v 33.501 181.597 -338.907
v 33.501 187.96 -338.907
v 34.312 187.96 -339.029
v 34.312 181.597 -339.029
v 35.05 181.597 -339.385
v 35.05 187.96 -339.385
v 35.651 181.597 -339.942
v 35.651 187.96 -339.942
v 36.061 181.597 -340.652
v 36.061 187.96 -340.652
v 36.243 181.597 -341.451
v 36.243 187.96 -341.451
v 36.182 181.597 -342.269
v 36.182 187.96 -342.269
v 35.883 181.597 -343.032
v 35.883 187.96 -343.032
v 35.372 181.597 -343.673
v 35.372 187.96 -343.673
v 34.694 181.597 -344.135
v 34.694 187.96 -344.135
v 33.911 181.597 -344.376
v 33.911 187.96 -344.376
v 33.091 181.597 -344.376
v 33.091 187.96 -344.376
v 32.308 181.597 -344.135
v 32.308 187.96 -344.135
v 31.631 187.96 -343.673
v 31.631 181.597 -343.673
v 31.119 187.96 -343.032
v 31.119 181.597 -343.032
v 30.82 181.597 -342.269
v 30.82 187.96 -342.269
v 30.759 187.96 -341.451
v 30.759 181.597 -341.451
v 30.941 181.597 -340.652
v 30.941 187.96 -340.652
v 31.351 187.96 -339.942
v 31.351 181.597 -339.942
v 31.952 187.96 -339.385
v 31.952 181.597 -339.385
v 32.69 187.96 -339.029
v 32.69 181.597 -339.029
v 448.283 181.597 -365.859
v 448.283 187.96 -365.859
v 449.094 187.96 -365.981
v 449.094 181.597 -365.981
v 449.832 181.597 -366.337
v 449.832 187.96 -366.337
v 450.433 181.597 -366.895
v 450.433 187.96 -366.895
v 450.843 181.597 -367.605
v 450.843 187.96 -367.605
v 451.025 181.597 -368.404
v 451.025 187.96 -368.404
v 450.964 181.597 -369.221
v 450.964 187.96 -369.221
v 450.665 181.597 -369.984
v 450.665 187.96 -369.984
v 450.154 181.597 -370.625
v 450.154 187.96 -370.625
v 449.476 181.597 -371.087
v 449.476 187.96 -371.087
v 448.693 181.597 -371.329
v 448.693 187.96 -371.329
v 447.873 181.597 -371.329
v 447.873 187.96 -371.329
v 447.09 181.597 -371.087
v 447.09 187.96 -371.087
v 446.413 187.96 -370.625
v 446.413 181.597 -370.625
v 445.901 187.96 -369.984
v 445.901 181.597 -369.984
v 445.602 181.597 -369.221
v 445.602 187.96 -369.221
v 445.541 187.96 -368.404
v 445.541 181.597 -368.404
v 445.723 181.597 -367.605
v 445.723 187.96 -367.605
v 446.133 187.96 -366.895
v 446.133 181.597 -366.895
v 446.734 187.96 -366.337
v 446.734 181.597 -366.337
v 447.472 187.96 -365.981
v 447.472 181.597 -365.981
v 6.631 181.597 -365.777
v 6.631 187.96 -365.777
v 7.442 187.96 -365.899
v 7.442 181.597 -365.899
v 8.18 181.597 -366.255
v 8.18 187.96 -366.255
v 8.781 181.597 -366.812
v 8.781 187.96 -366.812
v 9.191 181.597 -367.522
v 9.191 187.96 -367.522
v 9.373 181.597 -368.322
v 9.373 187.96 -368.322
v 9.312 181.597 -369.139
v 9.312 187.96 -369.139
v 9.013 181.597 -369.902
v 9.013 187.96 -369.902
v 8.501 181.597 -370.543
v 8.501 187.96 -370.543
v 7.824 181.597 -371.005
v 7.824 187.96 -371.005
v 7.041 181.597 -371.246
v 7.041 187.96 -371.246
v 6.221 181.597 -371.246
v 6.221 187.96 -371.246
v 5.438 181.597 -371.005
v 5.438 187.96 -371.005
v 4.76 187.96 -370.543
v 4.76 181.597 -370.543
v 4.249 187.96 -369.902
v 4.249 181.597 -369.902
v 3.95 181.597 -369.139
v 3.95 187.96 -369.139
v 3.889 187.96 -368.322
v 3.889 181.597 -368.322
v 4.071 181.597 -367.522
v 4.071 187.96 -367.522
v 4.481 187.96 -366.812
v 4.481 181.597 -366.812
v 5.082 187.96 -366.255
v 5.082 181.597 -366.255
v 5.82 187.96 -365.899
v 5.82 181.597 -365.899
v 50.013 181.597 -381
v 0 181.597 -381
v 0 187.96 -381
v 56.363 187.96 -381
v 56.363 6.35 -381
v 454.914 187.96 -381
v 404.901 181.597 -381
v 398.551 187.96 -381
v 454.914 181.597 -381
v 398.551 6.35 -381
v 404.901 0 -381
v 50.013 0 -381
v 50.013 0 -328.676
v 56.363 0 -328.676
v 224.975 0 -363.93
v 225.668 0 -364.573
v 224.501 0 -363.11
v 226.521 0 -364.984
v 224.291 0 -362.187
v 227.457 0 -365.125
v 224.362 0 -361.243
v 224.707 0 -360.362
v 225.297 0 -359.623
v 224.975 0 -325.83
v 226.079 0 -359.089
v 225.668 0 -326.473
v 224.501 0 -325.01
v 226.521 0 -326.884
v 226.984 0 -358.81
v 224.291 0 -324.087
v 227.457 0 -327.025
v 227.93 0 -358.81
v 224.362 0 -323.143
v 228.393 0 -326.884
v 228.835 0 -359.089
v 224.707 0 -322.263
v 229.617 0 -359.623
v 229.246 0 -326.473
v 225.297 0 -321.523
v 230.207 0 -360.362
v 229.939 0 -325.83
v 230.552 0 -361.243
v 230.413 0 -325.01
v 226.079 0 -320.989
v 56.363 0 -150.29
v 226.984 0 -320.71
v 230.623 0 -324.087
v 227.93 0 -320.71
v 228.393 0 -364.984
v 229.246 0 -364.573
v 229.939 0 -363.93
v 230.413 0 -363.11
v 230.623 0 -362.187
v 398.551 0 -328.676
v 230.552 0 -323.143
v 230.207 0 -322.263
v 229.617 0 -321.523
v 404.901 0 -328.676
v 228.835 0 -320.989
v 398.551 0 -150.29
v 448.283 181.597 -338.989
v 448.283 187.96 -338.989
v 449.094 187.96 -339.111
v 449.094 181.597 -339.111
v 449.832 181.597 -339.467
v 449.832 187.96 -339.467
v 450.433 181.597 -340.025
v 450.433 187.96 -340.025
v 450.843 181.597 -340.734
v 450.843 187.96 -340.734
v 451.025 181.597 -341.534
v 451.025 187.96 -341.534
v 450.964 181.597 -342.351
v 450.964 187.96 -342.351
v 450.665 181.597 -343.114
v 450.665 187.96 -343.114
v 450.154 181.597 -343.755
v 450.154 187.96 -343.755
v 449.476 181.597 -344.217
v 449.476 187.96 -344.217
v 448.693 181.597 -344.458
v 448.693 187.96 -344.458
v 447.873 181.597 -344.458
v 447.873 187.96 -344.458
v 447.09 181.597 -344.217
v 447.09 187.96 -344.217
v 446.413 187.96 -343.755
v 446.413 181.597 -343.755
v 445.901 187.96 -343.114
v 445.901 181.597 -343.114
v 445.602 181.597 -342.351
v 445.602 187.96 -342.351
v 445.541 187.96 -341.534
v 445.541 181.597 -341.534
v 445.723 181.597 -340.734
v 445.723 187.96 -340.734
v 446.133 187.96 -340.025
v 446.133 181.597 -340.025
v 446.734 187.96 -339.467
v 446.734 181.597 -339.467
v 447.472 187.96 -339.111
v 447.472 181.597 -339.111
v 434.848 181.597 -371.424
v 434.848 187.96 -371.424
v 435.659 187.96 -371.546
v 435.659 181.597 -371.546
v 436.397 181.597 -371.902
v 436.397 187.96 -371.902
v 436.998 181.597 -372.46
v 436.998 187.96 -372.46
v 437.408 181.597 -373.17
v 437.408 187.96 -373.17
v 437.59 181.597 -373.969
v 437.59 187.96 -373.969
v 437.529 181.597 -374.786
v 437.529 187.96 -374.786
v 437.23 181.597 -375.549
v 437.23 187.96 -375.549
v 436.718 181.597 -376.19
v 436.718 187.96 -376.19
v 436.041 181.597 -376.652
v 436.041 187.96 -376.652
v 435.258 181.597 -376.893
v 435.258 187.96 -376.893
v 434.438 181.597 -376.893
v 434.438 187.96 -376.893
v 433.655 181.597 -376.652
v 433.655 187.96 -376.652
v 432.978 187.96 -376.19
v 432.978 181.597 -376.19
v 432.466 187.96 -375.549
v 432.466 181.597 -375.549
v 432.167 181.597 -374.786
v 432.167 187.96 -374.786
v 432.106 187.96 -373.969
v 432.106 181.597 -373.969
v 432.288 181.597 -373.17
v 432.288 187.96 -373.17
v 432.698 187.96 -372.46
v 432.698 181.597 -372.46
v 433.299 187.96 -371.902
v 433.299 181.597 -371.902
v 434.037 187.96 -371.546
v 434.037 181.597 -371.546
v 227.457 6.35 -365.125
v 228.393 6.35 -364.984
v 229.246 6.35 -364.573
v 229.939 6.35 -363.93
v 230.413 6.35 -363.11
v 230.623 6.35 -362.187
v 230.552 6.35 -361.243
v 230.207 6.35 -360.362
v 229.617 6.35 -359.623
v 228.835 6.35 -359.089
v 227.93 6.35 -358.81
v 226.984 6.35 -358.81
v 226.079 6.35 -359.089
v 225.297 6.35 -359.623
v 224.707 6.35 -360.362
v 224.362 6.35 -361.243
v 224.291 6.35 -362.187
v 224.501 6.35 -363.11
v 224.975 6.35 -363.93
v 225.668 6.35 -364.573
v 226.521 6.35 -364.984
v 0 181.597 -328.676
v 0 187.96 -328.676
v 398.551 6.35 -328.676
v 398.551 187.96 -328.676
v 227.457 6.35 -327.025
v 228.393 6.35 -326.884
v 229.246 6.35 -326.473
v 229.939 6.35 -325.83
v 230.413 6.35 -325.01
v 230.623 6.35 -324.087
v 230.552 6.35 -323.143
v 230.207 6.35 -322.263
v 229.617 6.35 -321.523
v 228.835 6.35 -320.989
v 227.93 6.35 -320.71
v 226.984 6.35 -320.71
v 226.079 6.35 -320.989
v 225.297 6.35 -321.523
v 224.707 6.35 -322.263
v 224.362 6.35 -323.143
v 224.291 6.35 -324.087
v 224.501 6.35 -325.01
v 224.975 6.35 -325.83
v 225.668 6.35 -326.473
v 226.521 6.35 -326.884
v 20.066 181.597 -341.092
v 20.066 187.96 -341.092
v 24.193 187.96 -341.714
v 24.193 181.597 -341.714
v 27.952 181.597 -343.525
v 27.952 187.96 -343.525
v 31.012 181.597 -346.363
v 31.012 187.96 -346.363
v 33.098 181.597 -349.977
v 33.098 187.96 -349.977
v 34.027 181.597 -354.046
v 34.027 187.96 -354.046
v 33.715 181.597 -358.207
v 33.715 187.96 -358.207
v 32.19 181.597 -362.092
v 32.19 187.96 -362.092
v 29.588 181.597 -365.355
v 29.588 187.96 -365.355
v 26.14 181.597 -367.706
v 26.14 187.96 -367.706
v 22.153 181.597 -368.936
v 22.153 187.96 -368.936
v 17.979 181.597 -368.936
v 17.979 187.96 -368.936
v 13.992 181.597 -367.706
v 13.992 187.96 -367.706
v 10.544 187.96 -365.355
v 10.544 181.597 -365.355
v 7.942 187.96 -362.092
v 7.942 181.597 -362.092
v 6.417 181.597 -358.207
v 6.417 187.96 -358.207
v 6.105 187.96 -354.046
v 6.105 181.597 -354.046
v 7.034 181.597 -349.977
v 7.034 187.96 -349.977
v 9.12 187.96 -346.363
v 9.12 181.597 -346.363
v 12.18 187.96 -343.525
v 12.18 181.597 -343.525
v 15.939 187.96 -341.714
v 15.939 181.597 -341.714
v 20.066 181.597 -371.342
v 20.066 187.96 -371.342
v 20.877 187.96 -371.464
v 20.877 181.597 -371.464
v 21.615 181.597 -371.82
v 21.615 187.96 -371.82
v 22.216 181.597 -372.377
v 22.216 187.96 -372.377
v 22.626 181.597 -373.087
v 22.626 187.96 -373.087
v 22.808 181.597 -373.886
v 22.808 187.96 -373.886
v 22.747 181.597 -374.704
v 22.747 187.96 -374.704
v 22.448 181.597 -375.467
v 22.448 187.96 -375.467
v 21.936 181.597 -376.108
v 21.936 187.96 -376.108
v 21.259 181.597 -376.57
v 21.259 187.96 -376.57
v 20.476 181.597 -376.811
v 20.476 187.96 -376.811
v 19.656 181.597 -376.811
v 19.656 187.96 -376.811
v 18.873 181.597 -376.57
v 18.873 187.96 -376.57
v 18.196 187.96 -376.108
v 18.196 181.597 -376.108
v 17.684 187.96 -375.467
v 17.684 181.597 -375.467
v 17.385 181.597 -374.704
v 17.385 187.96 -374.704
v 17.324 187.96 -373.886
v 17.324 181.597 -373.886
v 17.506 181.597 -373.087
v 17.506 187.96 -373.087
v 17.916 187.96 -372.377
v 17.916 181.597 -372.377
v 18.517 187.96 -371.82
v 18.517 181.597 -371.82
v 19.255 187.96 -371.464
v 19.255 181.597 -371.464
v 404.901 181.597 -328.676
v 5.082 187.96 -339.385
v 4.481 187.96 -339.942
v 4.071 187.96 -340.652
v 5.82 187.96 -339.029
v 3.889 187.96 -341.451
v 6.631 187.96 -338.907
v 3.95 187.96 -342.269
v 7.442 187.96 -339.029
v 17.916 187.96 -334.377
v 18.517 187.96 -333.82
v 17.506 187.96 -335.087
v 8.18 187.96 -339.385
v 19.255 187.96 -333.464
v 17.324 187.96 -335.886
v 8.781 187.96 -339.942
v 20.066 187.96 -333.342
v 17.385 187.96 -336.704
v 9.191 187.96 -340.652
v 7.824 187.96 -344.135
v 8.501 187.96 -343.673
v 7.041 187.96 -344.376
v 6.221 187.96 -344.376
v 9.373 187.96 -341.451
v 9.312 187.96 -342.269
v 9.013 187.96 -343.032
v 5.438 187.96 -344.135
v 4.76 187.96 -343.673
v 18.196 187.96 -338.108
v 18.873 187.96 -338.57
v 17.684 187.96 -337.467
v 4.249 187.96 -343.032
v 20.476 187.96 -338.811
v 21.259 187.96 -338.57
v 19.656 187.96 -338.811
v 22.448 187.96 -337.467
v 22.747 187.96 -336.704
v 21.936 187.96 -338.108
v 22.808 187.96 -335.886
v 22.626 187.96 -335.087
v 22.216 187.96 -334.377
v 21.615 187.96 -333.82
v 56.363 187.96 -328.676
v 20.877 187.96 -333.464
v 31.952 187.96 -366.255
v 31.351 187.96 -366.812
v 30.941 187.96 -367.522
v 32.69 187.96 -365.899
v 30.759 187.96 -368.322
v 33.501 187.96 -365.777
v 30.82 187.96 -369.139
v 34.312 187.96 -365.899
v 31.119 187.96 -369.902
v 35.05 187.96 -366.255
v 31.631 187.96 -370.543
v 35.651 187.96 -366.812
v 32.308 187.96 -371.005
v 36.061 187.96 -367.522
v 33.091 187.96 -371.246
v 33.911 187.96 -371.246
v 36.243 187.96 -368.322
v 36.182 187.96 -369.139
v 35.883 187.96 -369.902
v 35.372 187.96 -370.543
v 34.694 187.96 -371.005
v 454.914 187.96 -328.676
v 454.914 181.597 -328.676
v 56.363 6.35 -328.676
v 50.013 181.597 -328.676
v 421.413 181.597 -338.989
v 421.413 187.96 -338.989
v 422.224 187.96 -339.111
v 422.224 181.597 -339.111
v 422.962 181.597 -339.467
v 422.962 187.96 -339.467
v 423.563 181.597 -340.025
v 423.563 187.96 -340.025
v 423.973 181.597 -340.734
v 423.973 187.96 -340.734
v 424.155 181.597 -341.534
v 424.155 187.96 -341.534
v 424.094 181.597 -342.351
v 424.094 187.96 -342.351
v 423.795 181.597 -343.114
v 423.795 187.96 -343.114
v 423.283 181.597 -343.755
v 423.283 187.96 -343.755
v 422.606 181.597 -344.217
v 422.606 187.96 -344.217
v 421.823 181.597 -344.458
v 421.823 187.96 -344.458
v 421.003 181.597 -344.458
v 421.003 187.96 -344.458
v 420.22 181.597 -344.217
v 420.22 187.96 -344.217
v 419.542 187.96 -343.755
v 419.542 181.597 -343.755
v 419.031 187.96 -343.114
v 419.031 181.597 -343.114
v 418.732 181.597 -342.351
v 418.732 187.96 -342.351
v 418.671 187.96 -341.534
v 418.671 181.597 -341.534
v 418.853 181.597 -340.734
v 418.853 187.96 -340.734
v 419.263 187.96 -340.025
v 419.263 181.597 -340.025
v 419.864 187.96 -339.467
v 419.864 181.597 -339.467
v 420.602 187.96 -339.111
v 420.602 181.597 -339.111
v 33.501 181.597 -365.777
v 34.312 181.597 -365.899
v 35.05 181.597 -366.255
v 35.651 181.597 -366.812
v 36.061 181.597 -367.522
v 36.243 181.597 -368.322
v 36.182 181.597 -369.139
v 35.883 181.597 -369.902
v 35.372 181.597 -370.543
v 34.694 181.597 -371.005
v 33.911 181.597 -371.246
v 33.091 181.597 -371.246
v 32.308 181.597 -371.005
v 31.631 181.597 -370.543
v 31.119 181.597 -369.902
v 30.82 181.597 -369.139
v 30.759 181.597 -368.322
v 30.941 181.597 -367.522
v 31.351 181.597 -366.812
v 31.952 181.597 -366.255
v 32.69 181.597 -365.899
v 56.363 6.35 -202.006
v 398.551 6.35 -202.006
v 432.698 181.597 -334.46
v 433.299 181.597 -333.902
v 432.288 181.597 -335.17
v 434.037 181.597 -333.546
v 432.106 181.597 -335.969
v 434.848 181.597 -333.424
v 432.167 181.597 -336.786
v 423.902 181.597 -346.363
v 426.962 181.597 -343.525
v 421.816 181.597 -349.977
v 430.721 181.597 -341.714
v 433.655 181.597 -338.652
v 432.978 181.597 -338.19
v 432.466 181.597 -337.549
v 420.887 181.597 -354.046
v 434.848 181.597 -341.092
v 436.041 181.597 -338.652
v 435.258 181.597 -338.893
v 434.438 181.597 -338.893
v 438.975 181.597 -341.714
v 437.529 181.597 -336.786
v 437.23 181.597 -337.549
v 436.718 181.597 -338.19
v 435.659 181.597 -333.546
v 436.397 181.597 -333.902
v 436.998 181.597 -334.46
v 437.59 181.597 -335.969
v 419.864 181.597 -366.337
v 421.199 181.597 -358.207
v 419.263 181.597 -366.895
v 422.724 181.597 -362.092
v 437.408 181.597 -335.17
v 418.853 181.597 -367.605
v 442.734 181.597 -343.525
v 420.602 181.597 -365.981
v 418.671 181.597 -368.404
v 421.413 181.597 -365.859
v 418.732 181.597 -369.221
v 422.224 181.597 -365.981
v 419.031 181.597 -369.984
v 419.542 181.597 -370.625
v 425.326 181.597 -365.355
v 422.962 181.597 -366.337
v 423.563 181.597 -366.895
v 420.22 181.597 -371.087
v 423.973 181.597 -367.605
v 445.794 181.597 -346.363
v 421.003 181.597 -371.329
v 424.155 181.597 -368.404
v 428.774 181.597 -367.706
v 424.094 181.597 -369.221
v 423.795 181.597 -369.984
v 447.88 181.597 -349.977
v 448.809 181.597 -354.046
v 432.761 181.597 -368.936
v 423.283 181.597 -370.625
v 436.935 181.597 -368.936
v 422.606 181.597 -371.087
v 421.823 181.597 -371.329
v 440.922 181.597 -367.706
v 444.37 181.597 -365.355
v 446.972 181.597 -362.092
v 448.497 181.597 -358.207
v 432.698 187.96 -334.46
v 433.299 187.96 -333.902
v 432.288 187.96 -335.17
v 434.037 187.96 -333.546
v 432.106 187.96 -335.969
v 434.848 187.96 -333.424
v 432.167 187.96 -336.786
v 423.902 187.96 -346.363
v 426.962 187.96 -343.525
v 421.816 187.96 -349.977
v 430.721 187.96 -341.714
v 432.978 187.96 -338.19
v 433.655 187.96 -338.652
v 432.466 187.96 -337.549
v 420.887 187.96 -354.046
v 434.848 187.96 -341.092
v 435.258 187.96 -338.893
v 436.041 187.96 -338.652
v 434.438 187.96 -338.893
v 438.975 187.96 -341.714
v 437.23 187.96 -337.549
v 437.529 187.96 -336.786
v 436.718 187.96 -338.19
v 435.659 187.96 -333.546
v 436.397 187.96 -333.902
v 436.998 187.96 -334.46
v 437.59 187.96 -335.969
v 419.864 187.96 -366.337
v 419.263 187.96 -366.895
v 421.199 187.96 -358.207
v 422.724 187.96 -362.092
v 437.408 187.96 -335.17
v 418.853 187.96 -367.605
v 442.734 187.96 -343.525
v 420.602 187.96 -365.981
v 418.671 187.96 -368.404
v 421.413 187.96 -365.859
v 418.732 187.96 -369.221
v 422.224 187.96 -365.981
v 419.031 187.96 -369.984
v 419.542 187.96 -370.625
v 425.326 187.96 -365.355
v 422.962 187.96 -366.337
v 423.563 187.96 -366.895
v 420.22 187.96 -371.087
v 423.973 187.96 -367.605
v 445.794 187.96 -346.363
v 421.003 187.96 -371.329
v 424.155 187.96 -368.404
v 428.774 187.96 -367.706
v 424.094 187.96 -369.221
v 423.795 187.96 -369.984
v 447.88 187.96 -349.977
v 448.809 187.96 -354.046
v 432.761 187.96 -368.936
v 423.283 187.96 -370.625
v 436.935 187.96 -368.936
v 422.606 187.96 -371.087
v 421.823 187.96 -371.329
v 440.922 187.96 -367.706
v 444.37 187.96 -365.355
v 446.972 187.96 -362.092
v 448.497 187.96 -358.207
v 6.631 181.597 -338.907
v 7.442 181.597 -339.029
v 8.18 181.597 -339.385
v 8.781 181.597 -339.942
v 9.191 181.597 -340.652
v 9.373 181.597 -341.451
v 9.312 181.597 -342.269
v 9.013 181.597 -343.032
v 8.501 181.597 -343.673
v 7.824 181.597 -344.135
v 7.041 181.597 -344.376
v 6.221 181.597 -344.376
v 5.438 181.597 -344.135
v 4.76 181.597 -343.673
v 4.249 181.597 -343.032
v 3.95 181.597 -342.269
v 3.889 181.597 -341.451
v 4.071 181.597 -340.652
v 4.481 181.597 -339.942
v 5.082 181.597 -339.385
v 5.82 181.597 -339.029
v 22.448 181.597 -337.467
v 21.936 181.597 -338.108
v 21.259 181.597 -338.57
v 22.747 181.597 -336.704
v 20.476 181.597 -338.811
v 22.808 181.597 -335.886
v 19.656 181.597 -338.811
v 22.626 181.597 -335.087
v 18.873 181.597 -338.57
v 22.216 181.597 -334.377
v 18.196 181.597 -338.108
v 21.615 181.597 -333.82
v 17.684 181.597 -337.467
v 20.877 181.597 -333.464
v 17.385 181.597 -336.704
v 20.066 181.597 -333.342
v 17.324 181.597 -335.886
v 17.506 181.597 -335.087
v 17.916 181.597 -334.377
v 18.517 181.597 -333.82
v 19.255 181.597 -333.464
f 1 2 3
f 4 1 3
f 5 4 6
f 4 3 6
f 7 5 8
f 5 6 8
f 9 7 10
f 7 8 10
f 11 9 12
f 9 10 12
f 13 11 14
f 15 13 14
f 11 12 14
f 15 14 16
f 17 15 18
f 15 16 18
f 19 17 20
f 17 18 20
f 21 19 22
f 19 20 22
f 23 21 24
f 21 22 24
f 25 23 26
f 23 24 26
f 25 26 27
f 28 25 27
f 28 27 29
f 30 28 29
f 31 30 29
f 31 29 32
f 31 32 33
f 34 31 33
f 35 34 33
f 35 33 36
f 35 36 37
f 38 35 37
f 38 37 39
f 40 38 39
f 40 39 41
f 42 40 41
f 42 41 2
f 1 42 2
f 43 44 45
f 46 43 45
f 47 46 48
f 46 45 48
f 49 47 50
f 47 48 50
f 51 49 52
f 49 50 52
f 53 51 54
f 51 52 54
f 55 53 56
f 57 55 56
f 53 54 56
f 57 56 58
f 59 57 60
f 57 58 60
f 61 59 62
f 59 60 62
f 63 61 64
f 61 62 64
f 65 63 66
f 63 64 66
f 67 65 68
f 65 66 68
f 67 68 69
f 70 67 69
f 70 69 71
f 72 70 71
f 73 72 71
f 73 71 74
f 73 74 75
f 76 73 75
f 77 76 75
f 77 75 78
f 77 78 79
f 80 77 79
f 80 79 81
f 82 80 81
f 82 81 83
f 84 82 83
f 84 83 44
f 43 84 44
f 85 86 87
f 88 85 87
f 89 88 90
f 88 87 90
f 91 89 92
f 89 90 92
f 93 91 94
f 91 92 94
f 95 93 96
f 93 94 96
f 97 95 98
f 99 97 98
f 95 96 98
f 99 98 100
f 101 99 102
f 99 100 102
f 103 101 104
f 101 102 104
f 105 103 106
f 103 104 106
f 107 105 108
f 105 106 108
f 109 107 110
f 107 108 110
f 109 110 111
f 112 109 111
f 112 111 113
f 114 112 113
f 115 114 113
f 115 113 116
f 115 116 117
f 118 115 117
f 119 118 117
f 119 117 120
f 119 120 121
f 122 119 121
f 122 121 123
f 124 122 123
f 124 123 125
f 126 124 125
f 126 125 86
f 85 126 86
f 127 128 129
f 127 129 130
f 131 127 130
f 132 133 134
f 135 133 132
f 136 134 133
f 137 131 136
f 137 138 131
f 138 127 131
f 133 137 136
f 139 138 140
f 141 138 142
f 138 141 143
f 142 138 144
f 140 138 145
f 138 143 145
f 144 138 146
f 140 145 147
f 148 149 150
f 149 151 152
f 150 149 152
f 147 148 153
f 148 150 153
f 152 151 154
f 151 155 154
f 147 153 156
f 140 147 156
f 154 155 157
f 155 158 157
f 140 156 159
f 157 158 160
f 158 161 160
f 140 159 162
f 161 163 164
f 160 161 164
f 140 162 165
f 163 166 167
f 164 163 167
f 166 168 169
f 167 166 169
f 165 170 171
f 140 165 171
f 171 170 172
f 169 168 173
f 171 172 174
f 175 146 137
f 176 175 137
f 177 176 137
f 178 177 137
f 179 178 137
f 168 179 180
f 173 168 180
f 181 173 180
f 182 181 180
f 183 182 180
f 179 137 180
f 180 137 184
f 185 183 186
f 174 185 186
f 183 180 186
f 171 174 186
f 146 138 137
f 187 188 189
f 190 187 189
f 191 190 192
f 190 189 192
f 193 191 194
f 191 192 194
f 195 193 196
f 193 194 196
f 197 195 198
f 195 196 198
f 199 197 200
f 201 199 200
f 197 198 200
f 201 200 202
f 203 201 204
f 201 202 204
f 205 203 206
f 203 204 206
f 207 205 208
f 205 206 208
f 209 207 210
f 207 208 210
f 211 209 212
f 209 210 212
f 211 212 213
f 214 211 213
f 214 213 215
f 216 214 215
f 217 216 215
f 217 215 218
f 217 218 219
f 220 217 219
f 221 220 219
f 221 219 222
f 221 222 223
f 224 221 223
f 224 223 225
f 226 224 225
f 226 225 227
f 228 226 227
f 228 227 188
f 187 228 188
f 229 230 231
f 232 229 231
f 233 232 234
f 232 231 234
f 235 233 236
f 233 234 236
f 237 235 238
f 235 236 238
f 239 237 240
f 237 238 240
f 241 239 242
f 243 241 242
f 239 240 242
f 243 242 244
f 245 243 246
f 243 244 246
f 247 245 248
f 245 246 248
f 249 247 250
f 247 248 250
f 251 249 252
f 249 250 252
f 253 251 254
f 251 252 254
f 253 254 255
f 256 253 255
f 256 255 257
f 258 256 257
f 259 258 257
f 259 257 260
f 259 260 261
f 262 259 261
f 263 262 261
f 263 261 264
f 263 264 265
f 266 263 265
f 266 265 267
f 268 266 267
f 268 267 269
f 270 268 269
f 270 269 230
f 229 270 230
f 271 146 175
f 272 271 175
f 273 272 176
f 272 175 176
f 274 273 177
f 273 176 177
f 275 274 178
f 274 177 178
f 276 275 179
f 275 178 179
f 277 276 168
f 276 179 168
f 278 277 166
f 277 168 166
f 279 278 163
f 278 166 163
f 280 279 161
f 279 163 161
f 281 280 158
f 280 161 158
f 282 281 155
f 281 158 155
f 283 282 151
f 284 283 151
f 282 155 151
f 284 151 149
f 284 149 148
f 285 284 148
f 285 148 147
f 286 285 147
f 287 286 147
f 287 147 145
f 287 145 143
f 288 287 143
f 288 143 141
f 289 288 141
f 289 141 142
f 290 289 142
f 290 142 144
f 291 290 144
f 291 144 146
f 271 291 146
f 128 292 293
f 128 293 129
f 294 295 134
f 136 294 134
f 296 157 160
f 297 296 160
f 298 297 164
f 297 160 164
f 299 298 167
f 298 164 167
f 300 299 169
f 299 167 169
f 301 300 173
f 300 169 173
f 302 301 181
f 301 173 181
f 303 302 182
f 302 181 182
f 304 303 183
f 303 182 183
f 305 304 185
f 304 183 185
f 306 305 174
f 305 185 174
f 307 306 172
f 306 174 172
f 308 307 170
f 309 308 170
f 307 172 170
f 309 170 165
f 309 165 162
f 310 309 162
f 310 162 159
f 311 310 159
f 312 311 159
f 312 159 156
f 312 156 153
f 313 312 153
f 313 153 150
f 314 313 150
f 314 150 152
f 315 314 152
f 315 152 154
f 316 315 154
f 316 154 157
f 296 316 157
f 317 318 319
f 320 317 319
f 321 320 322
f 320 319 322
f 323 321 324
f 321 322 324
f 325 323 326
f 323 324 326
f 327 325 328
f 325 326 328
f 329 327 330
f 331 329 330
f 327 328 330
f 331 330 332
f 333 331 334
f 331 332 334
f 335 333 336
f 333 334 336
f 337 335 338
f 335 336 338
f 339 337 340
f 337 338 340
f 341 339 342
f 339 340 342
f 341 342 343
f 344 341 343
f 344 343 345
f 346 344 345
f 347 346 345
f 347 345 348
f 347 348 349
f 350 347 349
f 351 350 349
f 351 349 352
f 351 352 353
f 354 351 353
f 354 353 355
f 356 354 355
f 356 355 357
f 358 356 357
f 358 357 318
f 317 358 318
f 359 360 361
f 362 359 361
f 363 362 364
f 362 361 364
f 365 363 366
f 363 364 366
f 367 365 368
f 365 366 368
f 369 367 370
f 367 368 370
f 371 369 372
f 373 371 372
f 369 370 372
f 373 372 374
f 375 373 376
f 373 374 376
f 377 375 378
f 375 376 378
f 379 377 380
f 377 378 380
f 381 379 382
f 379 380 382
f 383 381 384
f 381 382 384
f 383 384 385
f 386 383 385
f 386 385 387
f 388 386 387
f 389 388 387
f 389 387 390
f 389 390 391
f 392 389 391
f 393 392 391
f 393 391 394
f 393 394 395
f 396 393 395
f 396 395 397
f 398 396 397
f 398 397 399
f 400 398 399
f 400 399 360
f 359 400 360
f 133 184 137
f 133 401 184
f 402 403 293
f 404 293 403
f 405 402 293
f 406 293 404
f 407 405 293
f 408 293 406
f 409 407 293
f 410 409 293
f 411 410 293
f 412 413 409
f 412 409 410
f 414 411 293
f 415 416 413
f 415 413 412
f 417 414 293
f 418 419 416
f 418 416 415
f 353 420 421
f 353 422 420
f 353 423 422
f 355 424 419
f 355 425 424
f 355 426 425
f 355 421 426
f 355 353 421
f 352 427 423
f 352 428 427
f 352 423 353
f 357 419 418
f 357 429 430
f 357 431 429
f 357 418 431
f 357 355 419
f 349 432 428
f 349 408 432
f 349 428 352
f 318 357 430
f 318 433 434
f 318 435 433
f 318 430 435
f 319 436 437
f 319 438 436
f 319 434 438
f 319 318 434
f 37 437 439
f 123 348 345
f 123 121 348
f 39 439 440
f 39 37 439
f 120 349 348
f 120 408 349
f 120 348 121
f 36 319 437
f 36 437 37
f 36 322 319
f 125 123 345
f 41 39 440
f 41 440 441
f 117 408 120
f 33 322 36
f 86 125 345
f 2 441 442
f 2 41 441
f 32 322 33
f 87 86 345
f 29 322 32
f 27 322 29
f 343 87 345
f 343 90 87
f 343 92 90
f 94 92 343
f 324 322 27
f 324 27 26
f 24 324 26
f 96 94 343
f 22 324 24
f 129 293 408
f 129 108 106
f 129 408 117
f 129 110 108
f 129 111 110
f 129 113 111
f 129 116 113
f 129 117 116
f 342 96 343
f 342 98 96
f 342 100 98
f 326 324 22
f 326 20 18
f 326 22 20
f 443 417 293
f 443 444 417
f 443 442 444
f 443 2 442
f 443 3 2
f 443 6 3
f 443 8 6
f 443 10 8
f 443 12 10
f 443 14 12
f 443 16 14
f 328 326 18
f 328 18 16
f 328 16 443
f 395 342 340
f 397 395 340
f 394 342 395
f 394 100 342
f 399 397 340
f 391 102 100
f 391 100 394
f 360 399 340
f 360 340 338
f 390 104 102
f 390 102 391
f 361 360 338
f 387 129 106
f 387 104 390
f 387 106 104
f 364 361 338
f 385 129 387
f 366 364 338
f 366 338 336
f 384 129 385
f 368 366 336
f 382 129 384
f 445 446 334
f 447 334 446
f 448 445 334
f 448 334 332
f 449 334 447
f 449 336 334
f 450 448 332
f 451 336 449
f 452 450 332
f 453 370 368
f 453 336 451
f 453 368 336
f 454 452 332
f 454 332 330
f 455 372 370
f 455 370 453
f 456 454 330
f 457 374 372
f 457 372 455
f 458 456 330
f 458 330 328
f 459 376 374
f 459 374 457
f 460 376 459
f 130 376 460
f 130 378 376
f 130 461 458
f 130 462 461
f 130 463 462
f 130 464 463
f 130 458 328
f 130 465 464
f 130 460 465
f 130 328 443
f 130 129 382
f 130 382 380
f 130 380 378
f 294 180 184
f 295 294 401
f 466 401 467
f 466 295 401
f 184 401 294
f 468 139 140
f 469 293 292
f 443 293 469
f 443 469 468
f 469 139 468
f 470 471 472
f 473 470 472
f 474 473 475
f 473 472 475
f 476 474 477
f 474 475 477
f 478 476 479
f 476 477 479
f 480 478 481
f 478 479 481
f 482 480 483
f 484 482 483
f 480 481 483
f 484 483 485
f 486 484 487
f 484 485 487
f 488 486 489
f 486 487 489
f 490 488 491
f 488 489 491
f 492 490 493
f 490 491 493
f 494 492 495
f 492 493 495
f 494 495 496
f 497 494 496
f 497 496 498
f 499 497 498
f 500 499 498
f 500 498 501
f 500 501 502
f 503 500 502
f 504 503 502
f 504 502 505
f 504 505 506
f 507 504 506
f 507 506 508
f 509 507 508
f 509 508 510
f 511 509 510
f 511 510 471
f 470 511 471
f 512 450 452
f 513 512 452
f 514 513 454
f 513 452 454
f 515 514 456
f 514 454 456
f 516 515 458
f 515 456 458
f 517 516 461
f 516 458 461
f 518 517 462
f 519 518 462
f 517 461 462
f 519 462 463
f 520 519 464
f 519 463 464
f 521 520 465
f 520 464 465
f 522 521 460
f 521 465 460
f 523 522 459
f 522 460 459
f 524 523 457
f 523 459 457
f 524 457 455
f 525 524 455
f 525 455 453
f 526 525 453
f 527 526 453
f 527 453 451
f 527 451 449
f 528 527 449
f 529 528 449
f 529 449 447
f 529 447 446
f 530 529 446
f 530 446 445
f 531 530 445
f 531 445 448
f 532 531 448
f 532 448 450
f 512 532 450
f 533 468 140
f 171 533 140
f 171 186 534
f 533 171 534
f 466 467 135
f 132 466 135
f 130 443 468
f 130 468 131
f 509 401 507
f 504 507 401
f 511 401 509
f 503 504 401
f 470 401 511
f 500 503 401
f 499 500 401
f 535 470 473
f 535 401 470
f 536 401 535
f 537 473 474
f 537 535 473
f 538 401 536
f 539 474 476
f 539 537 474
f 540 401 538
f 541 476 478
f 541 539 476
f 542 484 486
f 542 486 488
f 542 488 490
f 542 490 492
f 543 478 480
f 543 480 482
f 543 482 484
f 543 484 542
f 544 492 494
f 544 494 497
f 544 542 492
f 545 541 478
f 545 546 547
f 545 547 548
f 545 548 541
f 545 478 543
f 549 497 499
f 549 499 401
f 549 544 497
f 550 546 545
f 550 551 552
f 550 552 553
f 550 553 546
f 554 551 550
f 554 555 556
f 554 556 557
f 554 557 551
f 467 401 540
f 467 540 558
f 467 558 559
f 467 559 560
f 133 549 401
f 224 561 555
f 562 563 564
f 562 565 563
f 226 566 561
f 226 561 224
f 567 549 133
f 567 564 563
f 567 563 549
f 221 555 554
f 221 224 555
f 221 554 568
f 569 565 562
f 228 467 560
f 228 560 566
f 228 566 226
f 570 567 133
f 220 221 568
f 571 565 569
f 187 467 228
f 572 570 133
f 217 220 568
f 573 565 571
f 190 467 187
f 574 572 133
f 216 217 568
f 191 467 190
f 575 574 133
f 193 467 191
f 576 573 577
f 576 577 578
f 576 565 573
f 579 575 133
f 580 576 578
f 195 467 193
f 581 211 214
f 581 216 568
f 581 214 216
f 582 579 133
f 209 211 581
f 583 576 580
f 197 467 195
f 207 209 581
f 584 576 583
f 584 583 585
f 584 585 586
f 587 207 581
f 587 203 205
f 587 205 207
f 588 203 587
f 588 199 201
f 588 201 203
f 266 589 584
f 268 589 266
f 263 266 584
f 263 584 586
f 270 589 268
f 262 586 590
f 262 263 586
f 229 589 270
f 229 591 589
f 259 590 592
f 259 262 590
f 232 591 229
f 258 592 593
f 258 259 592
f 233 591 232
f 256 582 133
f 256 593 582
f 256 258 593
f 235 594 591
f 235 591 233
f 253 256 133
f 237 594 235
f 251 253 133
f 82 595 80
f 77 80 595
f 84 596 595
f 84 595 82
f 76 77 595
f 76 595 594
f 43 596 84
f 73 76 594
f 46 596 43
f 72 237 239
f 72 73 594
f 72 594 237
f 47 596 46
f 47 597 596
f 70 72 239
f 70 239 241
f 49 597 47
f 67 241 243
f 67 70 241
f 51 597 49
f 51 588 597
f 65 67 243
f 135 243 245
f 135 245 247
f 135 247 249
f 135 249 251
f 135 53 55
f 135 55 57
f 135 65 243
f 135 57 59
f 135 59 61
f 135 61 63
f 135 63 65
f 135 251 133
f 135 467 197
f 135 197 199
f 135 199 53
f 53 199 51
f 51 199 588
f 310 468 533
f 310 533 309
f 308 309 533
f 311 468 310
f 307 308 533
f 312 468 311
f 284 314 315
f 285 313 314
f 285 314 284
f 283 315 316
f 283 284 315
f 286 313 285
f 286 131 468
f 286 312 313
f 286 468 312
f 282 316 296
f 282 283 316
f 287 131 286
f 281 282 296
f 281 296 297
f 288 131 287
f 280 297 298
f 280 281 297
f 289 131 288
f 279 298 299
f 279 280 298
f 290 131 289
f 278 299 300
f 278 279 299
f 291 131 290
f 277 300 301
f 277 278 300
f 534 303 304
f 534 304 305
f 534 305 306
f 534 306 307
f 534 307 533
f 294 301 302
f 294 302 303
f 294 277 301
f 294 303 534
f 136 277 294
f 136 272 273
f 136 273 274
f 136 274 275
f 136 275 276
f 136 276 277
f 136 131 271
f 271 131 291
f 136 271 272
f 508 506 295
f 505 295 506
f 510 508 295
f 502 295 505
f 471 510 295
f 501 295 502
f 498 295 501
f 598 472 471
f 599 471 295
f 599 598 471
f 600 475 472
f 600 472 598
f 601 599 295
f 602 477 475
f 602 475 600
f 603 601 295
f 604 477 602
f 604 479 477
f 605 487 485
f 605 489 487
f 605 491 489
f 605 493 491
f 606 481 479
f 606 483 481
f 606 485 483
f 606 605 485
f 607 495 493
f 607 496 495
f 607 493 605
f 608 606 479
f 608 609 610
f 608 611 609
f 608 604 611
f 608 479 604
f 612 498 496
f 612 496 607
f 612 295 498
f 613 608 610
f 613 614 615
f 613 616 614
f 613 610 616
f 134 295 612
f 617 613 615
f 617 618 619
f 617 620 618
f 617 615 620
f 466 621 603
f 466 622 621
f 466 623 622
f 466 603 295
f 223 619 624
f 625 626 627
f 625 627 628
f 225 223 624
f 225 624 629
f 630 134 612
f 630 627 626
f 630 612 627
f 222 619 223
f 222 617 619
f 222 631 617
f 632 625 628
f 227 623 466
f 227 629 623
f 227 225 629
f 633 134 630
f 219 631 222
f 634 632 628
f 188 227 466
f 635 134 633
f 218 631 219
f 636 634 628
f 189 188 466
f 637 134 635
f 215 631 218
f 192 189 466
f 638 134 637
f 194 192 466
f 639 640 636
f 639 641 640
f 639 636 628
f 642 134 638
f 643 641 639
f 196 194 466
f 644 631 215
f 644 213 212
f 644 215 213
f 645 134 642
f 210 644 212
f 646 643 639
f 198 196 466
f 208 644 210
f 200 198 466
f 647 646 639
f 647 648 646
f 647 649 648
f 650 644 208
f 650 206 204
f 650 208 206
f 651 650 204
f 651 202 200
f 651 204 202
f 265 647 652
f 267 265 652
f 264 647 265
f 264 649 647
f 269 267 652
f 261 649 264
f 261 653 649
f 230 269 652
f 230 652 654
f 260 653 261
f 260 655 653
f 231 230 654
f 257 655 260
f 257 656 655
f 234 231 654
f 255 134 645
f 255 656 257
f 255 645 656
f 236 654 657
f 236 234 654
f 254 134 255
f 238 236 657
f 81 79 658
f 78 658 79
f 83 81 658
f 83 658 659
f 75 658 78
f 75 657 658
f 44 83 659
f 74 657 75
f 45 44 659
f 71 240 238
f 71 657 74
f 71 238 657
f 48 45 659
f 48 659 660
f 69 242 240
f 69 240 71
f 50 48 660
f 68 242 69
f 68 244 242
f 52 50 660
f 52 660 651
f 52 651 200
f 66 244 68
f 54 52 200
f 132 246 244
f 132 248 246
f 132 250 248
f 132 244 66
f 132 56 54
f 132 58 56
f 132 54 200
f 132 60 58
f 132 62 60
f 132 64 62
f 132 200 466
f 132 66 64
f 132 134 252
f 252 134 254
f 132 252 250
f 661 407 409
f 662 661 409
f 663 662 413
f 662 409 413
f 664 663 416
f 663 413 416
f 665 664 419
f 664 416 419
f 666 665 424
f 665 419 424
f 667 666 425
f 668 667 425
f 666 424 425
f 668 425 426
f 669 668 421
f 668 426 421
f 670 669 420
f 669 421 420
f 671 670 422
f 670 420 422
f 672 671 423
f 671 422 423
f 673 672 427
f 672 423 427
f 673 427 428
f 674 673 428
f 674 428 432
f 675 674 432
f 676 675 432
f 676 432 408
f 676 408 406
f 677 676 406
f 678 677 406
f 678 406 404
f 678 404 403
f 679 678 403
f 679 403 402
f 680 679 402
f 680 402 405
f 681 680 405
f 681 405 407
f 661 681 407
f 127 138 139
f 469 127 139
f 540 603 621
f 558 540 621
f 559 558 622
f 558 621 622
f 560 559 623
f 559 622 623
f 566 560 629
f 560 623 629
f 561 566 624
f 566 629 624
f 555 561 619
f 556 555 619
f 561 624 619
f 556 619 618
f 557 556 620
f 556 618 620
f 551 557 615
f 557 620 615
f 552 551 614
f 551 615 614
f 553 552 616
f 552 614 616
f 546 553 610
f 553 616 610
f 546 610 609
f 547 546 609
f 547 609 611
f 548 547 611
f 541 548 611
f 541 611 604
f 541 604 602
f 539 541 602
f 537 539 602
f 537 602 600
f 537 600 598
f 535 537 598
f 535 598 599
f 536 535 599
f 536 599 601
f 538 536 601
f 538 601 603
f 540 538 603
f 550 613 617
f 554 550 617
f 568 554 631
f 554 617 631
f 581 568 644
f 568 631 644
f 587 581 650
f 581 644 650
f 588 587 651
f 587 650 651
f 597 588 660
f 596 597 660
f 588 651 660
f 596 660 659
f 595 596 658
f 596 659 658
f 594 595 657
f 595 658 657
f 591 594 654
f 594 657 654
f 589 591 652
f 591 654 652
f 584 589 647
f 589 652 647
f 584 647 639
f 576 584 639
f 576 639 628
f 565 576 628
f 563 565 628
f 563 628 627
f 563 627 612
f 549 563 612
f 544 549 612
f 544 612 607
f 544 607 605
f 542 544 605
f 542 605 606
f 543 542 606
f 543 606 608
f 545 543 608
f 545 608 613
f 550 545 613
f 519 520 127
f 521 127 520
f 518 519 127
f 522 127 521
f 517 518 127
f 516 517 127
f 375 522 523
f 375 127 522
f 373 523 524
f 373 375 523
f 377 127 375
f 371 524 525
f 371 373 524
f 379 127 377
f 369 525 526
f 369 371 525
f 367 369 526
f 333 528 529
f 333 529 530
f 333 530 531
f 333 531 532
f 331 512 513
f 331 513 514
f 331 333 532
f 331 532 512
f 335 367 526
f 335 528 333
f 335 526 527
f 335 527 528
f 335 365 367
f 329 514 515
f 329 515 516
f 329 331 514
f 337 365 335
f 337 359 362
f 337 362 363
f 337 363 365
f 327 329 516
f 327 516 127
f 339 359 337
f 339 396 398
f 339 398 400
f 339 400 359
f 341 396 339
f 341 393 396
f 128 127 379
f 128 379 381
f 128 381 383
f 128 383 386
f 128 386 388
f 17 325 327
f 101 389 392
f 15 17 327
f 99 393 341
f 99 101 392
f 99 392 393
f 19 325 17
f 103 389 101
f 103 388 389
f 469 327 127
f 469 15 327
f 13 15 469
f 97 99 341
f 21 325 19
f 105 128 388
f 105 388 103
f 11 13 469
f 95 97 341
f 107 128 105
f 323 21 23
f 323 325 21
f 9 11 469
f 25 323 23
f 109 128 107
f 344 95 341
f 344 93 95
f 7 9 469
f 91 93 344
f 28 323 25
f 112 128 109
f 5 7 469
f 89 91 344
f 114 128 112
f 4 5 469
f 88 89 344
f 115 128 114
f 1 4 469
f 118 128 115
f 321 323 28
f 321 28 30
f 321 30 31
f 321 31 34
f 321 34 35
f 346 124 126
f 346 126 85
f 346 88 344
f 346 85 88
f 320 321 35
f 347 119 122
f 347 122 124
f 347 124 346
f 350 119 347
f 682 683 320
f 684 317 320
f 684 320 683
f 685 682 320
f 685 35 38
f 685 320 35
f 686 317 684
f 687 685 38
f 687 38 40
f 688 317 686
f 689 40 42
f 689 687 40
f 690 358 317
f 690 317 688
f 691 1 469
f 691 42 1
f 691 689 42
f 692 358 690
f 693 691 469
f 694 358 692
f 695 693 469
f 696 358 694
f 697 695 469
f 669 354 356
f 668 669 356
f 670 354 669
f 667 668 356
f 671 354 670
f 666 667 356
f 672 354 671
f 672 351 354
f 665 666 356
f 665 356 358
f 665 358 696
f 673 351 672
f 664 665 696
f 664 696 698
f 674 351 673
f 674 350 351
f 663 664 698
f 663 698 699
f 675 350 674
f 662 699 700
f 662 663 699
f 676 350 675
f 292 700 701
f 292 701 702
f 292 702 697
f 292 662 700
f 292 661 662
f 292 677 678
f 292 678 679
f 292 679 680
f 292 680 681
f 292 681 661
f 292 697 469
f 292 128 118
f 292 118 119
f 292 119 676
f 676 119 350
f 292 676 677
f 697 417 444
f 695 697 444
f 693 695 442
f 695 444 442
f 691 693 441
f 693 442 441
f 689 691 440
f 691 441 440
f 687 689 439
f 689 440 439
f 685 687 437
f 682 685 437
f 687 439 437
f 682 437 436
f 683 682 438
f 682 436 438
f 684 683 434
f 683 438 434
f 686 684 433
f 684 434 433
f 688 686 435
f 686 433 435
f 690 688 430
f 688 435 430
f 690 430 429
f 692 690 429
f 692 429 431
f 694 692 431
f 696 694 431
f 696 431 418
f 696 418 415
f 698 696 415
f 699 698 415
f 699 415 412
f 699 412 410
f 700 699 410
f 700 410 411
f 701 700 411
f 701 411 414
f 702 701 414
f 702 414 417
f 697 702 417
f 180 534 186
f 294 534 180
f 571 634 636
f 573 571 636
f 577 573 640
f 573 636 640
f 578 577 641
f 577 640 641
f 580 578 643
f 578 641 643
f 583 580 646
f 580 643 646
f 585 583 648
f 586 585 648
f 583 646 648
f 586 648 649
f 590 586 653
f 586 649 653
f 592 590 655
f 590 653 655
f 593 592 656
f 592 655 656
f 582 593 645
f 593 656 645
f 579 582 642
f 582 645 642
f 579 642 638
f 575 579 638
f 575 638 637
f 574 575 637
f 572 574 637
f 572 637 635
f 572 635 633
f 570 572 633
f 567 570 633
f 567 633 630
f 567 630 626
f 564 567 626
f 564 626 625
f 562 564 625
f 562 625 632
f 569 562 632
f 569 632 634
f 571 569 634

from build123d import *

# Parameters (mm, degrees)
SKETCH1_W           = 454.914
SKETCH1_H           = 381
BOSS_EXTRUDE1_DEPTH = 187.96
SKETCH3_W           = 50.0126
SKETCH3_H           = 202.0062
CUT_EXTRUDE1_DEPTH  = 623.444141266
SKETCH4_R           = 14
CUT_EXTRUDE2_DEPTH  = 623.444141266
SKETCH5_W           = 342.1888
SKETCH5_H           = 381
CUT_EXTRUDE3_DEPTH  = 181.61
SKETCH6_W           = 178.9938
SKETCH6_H           = 181.597400076
CUT_EXTRUDE4_DEPTH  = 50.0126
SKETCH7_W           = 178.9938
SKETCH7_H           = 181.597400076
CUT_EXTRUDE5_DEPTH  = 50.0126
SKETCH10_W          = 202.0062
SKETCH10_H          = 187.96
CUT_EXTRUDE6_DEPTH  = 587.885938937
SKETCH11_R          = 2.7499945
SKETCH11_R_2        = 2.75
CUT_EXTRUDE7_DEPTH  = 623.444141266
SKETCH12_R          = 2.75
CUT_EXTRUDE8_DEPTH  = 623.444141266
BOSS_EXTRUDE2_DEPTH = 342.1888
SKETCH15_W          = 56.3626
SKETCH15_H          = 126.6698
CUT_EXTRUDE9_DEPTH  = 623.444141266
SKETCH16_R          = 3.175
CUT_EXTRUDE10_DEPTH = 623.444141266


with BuildPart() as part:
    # Sketch1 → Boss-Extrude1 (new body)
    with BuildSketch(Plane(origin=(0, 0, 0), x_dir=(1, 0, 0), z_dir=(0, 1, 0))):
        with Locations((227.457, 190.5)):
            Rectangle(SKETCH1_W, SKETCH1_H)
    extrude(amount=BOSS_EXTRUDE1_DEPTH)

    # Sketch3 → Cut-Extrude1 (cut, through all)
    with BuildSketch(Plane(origin=(0, 187.96, 0), x_dir=(1, 0, 0), z_dir=(0, 1, 0))):
        with Locations((429.9077, 101.0031)):
            Rectangle(SKETCH3_W, SKETCH3_H)
        with Locations((25.0063, 101.0031)):
            Rectangle(SKETCH3_W, SKETCH3_H)
    extrude(amount=-CUT_EXTRUDE1_DEPTH, mode=Mode.SUBTRACT)

    # Sketch4 → Cut-Extrude2 (cut, through all)
    with BuildSketch(Plane(origin=(0, 187.96, 0), x_dir=(1, 0, 0), z_dir=(0, 1, 0))):
        with Locations(Location((20.066, 355.092, 0), (0, 0, 270))):
            Circle(SKETCH4_R)
        with Locations(Location((434.848, 355.092, 0), (0, 0, 270))):
            Circle(SKETCH4_R)
    extrude(amount=-CUT_EXTRUDE2_DEPTH, mode=Mode.SUBTRACT)

    # Sketch5 → Cut-Extrude3 (cut)
    with BuildSketch(Plane(origin=(0, 187.96, 0), x_dir=(1, 0, 0), z_dir=(0, 1, 0))):
        with Locations((227.457, 190.5)):
            Rectangle(SKETCH5_W, SKETCH5_H)
    extrude(amount=-CUT_EXTRUDE3_DEPTH, mode=Mode.SUBTRACT)

    # Sketch6 → Cut-Extrude4 (cut)
    with BuildSketch(Plane(origin=(454.914, 0, 0), x_dir=(0, 0, -1), z_dir=(1, 0, 0))):
        with Locations((291.5031, 90.798700038)):
            Rectangle(SKETCH6_W, SKETCH6_H)
    extrude(amount=-CUT_EXTRUDE4_DEPTH, mode=Mode.SUBTRACT)

    # Sketch7 → Cut-Extrude5 (cut)
    with BuildSketch(Plane.ZY):
        with Locations((-291.5031, 90.798700038)):
            Rectangle(SKETCH7_W, SKETCH7_H)
    extrude(amount=-CUT_EXTRUDE5_DEPTH, mode=Mode.SUBTRACT)

    # Sketch10 → Cut-Extrude6 (cut, through all)
    with BuildSketch(Plane(origin=(404.9014, 0, 0), x_dir=(0, 0, -1), z_dir=(1, 0, 0))):
        with Locations((101.0031, 93.98)):
            Rectangle(SKETCH10_W, SKETCH10_H)
    extrude(amount=-CUT_EXTRUDE6_DEPTH, mode=Mode.SUBTRACT)

    # Sketch11 → Cut-Extrude7 (cut, through all)
    with BuildSketch(Plane(origin=(0, 187.96, 0), x_dir=(1, 0, 0), z_dir=(0, 1, 0))):
        with Locations(Location((434.848, 374.174211985, 0), (0, 0, 270))):
            Circle(SKETCH11_R)
        with Locations(Location((448.283028843, 368.609240827, 0), (0, 0, 270))):
            Circle(SKETCH11_R_2)
        with Locations(Location((421.412971157, 368.609240827, 0), (0, 0, 270))):
            Circle(SKETCH11_R_2)
        with Locations(Location((448.283028843, 341.739183142, 0), (0, 0, 270))):
            Circle(SKETCH11_R_2)
        with Locations(Location((434.848, 336.174211985, 0), (0, 0, 270))):
            Circle(SKETCH11_R_2)
        with Locations(Location((421.412971157, 341.739183142, 0), (0, 0, 270))):
            Circle(SKETCH11_R_2)
    extrude(amount=-CUT_EXTRUDE7_DEPTH, mode=Mode.SUBTRACT)

    # Sketch12 → Cut-Extrude8 (cut, through all)
    with BuildSketch(Plane(origin=(0, 187.96, 0), x_dir=(1, 0, 0), z_dir=(0, 1, 0))):
        with Locations(Location((20.066, 374.092, 0), (0, 0, 270))):
            Circle(SKETCH12_R)
        with Locations(Location((6.630971157, 368.527028843, 0), (0, 0, 270))):
            Circle(SKETCH12_R)
        with Locations(Location((33.501028843, 368.527028843, 0), (0, 0, 270))):
            Circle(SKETCH12_R)
        with Locations(Location((33.501028843, 341.656971157, 0), (0, 0, 270))):
            Circle(SKETCH12_R)
        with Locations(Location((20.066, 336.092, 0), (0, 0, 270))):
            Circle(SKETCH12_R)
        with Locations(Location((6.630971157, 341.656971157, 0), (0, 0, 270))):
            Circle(SKETCH12_R)
    extrude(amount=-CUT_EXTRUDE8_DEPTH, mode=Mode.SUBTRACT)

    # Sketch13 → Boss-Extrude2 (add)
    with BuildSketch(Plane(origin=(398.5514, 0, 0), x_dir=(0, 0, -1), z_dir=(1, 0, 0))):
        Polygon((202.0062, 0), (150.289600182, 0), (202.0062, 6.35), align=None)
    extrude(amount=-BOSS_EXTRUDE2_DEPTH)

    # Sketch15 → Cut-Extrude9 (cut, through all)
    with BuildSketch(Plane(origin=(0, 187.96, 0), x_dir=(1, 0, 0), z_dir=(0, 1, 0))):
        with Locations((426.7327, 265.3411)):
            Rectangle(SKETCH15_W, SKETCH15_H)
        with Locations((28.1813, 265.3411)):
            Rectangle(SKETCH15_W, SKETCH15_H)
    extrude(amount=-CUT_EXTRUDE9_DEPTH, mode=Mode.SUBTRACT)

    # Sketch16 → Cut-Extrude10 (cut, through all)
    with BuildSketch(Plane.XZ):
        with Locations(Location((227.457, -361.95, 0), (0, 0, 270))):
            Circle(SKETCH16_R)
        with Locations(Location((227.457, -323.85, 0), (0, 0, 270))):
            Circle(SKETCH16_R)
    extrude(amount=-CUT_EXTRUDE10_DEPTH, mode=Mode.SUBTRACT)


solid = part.part
